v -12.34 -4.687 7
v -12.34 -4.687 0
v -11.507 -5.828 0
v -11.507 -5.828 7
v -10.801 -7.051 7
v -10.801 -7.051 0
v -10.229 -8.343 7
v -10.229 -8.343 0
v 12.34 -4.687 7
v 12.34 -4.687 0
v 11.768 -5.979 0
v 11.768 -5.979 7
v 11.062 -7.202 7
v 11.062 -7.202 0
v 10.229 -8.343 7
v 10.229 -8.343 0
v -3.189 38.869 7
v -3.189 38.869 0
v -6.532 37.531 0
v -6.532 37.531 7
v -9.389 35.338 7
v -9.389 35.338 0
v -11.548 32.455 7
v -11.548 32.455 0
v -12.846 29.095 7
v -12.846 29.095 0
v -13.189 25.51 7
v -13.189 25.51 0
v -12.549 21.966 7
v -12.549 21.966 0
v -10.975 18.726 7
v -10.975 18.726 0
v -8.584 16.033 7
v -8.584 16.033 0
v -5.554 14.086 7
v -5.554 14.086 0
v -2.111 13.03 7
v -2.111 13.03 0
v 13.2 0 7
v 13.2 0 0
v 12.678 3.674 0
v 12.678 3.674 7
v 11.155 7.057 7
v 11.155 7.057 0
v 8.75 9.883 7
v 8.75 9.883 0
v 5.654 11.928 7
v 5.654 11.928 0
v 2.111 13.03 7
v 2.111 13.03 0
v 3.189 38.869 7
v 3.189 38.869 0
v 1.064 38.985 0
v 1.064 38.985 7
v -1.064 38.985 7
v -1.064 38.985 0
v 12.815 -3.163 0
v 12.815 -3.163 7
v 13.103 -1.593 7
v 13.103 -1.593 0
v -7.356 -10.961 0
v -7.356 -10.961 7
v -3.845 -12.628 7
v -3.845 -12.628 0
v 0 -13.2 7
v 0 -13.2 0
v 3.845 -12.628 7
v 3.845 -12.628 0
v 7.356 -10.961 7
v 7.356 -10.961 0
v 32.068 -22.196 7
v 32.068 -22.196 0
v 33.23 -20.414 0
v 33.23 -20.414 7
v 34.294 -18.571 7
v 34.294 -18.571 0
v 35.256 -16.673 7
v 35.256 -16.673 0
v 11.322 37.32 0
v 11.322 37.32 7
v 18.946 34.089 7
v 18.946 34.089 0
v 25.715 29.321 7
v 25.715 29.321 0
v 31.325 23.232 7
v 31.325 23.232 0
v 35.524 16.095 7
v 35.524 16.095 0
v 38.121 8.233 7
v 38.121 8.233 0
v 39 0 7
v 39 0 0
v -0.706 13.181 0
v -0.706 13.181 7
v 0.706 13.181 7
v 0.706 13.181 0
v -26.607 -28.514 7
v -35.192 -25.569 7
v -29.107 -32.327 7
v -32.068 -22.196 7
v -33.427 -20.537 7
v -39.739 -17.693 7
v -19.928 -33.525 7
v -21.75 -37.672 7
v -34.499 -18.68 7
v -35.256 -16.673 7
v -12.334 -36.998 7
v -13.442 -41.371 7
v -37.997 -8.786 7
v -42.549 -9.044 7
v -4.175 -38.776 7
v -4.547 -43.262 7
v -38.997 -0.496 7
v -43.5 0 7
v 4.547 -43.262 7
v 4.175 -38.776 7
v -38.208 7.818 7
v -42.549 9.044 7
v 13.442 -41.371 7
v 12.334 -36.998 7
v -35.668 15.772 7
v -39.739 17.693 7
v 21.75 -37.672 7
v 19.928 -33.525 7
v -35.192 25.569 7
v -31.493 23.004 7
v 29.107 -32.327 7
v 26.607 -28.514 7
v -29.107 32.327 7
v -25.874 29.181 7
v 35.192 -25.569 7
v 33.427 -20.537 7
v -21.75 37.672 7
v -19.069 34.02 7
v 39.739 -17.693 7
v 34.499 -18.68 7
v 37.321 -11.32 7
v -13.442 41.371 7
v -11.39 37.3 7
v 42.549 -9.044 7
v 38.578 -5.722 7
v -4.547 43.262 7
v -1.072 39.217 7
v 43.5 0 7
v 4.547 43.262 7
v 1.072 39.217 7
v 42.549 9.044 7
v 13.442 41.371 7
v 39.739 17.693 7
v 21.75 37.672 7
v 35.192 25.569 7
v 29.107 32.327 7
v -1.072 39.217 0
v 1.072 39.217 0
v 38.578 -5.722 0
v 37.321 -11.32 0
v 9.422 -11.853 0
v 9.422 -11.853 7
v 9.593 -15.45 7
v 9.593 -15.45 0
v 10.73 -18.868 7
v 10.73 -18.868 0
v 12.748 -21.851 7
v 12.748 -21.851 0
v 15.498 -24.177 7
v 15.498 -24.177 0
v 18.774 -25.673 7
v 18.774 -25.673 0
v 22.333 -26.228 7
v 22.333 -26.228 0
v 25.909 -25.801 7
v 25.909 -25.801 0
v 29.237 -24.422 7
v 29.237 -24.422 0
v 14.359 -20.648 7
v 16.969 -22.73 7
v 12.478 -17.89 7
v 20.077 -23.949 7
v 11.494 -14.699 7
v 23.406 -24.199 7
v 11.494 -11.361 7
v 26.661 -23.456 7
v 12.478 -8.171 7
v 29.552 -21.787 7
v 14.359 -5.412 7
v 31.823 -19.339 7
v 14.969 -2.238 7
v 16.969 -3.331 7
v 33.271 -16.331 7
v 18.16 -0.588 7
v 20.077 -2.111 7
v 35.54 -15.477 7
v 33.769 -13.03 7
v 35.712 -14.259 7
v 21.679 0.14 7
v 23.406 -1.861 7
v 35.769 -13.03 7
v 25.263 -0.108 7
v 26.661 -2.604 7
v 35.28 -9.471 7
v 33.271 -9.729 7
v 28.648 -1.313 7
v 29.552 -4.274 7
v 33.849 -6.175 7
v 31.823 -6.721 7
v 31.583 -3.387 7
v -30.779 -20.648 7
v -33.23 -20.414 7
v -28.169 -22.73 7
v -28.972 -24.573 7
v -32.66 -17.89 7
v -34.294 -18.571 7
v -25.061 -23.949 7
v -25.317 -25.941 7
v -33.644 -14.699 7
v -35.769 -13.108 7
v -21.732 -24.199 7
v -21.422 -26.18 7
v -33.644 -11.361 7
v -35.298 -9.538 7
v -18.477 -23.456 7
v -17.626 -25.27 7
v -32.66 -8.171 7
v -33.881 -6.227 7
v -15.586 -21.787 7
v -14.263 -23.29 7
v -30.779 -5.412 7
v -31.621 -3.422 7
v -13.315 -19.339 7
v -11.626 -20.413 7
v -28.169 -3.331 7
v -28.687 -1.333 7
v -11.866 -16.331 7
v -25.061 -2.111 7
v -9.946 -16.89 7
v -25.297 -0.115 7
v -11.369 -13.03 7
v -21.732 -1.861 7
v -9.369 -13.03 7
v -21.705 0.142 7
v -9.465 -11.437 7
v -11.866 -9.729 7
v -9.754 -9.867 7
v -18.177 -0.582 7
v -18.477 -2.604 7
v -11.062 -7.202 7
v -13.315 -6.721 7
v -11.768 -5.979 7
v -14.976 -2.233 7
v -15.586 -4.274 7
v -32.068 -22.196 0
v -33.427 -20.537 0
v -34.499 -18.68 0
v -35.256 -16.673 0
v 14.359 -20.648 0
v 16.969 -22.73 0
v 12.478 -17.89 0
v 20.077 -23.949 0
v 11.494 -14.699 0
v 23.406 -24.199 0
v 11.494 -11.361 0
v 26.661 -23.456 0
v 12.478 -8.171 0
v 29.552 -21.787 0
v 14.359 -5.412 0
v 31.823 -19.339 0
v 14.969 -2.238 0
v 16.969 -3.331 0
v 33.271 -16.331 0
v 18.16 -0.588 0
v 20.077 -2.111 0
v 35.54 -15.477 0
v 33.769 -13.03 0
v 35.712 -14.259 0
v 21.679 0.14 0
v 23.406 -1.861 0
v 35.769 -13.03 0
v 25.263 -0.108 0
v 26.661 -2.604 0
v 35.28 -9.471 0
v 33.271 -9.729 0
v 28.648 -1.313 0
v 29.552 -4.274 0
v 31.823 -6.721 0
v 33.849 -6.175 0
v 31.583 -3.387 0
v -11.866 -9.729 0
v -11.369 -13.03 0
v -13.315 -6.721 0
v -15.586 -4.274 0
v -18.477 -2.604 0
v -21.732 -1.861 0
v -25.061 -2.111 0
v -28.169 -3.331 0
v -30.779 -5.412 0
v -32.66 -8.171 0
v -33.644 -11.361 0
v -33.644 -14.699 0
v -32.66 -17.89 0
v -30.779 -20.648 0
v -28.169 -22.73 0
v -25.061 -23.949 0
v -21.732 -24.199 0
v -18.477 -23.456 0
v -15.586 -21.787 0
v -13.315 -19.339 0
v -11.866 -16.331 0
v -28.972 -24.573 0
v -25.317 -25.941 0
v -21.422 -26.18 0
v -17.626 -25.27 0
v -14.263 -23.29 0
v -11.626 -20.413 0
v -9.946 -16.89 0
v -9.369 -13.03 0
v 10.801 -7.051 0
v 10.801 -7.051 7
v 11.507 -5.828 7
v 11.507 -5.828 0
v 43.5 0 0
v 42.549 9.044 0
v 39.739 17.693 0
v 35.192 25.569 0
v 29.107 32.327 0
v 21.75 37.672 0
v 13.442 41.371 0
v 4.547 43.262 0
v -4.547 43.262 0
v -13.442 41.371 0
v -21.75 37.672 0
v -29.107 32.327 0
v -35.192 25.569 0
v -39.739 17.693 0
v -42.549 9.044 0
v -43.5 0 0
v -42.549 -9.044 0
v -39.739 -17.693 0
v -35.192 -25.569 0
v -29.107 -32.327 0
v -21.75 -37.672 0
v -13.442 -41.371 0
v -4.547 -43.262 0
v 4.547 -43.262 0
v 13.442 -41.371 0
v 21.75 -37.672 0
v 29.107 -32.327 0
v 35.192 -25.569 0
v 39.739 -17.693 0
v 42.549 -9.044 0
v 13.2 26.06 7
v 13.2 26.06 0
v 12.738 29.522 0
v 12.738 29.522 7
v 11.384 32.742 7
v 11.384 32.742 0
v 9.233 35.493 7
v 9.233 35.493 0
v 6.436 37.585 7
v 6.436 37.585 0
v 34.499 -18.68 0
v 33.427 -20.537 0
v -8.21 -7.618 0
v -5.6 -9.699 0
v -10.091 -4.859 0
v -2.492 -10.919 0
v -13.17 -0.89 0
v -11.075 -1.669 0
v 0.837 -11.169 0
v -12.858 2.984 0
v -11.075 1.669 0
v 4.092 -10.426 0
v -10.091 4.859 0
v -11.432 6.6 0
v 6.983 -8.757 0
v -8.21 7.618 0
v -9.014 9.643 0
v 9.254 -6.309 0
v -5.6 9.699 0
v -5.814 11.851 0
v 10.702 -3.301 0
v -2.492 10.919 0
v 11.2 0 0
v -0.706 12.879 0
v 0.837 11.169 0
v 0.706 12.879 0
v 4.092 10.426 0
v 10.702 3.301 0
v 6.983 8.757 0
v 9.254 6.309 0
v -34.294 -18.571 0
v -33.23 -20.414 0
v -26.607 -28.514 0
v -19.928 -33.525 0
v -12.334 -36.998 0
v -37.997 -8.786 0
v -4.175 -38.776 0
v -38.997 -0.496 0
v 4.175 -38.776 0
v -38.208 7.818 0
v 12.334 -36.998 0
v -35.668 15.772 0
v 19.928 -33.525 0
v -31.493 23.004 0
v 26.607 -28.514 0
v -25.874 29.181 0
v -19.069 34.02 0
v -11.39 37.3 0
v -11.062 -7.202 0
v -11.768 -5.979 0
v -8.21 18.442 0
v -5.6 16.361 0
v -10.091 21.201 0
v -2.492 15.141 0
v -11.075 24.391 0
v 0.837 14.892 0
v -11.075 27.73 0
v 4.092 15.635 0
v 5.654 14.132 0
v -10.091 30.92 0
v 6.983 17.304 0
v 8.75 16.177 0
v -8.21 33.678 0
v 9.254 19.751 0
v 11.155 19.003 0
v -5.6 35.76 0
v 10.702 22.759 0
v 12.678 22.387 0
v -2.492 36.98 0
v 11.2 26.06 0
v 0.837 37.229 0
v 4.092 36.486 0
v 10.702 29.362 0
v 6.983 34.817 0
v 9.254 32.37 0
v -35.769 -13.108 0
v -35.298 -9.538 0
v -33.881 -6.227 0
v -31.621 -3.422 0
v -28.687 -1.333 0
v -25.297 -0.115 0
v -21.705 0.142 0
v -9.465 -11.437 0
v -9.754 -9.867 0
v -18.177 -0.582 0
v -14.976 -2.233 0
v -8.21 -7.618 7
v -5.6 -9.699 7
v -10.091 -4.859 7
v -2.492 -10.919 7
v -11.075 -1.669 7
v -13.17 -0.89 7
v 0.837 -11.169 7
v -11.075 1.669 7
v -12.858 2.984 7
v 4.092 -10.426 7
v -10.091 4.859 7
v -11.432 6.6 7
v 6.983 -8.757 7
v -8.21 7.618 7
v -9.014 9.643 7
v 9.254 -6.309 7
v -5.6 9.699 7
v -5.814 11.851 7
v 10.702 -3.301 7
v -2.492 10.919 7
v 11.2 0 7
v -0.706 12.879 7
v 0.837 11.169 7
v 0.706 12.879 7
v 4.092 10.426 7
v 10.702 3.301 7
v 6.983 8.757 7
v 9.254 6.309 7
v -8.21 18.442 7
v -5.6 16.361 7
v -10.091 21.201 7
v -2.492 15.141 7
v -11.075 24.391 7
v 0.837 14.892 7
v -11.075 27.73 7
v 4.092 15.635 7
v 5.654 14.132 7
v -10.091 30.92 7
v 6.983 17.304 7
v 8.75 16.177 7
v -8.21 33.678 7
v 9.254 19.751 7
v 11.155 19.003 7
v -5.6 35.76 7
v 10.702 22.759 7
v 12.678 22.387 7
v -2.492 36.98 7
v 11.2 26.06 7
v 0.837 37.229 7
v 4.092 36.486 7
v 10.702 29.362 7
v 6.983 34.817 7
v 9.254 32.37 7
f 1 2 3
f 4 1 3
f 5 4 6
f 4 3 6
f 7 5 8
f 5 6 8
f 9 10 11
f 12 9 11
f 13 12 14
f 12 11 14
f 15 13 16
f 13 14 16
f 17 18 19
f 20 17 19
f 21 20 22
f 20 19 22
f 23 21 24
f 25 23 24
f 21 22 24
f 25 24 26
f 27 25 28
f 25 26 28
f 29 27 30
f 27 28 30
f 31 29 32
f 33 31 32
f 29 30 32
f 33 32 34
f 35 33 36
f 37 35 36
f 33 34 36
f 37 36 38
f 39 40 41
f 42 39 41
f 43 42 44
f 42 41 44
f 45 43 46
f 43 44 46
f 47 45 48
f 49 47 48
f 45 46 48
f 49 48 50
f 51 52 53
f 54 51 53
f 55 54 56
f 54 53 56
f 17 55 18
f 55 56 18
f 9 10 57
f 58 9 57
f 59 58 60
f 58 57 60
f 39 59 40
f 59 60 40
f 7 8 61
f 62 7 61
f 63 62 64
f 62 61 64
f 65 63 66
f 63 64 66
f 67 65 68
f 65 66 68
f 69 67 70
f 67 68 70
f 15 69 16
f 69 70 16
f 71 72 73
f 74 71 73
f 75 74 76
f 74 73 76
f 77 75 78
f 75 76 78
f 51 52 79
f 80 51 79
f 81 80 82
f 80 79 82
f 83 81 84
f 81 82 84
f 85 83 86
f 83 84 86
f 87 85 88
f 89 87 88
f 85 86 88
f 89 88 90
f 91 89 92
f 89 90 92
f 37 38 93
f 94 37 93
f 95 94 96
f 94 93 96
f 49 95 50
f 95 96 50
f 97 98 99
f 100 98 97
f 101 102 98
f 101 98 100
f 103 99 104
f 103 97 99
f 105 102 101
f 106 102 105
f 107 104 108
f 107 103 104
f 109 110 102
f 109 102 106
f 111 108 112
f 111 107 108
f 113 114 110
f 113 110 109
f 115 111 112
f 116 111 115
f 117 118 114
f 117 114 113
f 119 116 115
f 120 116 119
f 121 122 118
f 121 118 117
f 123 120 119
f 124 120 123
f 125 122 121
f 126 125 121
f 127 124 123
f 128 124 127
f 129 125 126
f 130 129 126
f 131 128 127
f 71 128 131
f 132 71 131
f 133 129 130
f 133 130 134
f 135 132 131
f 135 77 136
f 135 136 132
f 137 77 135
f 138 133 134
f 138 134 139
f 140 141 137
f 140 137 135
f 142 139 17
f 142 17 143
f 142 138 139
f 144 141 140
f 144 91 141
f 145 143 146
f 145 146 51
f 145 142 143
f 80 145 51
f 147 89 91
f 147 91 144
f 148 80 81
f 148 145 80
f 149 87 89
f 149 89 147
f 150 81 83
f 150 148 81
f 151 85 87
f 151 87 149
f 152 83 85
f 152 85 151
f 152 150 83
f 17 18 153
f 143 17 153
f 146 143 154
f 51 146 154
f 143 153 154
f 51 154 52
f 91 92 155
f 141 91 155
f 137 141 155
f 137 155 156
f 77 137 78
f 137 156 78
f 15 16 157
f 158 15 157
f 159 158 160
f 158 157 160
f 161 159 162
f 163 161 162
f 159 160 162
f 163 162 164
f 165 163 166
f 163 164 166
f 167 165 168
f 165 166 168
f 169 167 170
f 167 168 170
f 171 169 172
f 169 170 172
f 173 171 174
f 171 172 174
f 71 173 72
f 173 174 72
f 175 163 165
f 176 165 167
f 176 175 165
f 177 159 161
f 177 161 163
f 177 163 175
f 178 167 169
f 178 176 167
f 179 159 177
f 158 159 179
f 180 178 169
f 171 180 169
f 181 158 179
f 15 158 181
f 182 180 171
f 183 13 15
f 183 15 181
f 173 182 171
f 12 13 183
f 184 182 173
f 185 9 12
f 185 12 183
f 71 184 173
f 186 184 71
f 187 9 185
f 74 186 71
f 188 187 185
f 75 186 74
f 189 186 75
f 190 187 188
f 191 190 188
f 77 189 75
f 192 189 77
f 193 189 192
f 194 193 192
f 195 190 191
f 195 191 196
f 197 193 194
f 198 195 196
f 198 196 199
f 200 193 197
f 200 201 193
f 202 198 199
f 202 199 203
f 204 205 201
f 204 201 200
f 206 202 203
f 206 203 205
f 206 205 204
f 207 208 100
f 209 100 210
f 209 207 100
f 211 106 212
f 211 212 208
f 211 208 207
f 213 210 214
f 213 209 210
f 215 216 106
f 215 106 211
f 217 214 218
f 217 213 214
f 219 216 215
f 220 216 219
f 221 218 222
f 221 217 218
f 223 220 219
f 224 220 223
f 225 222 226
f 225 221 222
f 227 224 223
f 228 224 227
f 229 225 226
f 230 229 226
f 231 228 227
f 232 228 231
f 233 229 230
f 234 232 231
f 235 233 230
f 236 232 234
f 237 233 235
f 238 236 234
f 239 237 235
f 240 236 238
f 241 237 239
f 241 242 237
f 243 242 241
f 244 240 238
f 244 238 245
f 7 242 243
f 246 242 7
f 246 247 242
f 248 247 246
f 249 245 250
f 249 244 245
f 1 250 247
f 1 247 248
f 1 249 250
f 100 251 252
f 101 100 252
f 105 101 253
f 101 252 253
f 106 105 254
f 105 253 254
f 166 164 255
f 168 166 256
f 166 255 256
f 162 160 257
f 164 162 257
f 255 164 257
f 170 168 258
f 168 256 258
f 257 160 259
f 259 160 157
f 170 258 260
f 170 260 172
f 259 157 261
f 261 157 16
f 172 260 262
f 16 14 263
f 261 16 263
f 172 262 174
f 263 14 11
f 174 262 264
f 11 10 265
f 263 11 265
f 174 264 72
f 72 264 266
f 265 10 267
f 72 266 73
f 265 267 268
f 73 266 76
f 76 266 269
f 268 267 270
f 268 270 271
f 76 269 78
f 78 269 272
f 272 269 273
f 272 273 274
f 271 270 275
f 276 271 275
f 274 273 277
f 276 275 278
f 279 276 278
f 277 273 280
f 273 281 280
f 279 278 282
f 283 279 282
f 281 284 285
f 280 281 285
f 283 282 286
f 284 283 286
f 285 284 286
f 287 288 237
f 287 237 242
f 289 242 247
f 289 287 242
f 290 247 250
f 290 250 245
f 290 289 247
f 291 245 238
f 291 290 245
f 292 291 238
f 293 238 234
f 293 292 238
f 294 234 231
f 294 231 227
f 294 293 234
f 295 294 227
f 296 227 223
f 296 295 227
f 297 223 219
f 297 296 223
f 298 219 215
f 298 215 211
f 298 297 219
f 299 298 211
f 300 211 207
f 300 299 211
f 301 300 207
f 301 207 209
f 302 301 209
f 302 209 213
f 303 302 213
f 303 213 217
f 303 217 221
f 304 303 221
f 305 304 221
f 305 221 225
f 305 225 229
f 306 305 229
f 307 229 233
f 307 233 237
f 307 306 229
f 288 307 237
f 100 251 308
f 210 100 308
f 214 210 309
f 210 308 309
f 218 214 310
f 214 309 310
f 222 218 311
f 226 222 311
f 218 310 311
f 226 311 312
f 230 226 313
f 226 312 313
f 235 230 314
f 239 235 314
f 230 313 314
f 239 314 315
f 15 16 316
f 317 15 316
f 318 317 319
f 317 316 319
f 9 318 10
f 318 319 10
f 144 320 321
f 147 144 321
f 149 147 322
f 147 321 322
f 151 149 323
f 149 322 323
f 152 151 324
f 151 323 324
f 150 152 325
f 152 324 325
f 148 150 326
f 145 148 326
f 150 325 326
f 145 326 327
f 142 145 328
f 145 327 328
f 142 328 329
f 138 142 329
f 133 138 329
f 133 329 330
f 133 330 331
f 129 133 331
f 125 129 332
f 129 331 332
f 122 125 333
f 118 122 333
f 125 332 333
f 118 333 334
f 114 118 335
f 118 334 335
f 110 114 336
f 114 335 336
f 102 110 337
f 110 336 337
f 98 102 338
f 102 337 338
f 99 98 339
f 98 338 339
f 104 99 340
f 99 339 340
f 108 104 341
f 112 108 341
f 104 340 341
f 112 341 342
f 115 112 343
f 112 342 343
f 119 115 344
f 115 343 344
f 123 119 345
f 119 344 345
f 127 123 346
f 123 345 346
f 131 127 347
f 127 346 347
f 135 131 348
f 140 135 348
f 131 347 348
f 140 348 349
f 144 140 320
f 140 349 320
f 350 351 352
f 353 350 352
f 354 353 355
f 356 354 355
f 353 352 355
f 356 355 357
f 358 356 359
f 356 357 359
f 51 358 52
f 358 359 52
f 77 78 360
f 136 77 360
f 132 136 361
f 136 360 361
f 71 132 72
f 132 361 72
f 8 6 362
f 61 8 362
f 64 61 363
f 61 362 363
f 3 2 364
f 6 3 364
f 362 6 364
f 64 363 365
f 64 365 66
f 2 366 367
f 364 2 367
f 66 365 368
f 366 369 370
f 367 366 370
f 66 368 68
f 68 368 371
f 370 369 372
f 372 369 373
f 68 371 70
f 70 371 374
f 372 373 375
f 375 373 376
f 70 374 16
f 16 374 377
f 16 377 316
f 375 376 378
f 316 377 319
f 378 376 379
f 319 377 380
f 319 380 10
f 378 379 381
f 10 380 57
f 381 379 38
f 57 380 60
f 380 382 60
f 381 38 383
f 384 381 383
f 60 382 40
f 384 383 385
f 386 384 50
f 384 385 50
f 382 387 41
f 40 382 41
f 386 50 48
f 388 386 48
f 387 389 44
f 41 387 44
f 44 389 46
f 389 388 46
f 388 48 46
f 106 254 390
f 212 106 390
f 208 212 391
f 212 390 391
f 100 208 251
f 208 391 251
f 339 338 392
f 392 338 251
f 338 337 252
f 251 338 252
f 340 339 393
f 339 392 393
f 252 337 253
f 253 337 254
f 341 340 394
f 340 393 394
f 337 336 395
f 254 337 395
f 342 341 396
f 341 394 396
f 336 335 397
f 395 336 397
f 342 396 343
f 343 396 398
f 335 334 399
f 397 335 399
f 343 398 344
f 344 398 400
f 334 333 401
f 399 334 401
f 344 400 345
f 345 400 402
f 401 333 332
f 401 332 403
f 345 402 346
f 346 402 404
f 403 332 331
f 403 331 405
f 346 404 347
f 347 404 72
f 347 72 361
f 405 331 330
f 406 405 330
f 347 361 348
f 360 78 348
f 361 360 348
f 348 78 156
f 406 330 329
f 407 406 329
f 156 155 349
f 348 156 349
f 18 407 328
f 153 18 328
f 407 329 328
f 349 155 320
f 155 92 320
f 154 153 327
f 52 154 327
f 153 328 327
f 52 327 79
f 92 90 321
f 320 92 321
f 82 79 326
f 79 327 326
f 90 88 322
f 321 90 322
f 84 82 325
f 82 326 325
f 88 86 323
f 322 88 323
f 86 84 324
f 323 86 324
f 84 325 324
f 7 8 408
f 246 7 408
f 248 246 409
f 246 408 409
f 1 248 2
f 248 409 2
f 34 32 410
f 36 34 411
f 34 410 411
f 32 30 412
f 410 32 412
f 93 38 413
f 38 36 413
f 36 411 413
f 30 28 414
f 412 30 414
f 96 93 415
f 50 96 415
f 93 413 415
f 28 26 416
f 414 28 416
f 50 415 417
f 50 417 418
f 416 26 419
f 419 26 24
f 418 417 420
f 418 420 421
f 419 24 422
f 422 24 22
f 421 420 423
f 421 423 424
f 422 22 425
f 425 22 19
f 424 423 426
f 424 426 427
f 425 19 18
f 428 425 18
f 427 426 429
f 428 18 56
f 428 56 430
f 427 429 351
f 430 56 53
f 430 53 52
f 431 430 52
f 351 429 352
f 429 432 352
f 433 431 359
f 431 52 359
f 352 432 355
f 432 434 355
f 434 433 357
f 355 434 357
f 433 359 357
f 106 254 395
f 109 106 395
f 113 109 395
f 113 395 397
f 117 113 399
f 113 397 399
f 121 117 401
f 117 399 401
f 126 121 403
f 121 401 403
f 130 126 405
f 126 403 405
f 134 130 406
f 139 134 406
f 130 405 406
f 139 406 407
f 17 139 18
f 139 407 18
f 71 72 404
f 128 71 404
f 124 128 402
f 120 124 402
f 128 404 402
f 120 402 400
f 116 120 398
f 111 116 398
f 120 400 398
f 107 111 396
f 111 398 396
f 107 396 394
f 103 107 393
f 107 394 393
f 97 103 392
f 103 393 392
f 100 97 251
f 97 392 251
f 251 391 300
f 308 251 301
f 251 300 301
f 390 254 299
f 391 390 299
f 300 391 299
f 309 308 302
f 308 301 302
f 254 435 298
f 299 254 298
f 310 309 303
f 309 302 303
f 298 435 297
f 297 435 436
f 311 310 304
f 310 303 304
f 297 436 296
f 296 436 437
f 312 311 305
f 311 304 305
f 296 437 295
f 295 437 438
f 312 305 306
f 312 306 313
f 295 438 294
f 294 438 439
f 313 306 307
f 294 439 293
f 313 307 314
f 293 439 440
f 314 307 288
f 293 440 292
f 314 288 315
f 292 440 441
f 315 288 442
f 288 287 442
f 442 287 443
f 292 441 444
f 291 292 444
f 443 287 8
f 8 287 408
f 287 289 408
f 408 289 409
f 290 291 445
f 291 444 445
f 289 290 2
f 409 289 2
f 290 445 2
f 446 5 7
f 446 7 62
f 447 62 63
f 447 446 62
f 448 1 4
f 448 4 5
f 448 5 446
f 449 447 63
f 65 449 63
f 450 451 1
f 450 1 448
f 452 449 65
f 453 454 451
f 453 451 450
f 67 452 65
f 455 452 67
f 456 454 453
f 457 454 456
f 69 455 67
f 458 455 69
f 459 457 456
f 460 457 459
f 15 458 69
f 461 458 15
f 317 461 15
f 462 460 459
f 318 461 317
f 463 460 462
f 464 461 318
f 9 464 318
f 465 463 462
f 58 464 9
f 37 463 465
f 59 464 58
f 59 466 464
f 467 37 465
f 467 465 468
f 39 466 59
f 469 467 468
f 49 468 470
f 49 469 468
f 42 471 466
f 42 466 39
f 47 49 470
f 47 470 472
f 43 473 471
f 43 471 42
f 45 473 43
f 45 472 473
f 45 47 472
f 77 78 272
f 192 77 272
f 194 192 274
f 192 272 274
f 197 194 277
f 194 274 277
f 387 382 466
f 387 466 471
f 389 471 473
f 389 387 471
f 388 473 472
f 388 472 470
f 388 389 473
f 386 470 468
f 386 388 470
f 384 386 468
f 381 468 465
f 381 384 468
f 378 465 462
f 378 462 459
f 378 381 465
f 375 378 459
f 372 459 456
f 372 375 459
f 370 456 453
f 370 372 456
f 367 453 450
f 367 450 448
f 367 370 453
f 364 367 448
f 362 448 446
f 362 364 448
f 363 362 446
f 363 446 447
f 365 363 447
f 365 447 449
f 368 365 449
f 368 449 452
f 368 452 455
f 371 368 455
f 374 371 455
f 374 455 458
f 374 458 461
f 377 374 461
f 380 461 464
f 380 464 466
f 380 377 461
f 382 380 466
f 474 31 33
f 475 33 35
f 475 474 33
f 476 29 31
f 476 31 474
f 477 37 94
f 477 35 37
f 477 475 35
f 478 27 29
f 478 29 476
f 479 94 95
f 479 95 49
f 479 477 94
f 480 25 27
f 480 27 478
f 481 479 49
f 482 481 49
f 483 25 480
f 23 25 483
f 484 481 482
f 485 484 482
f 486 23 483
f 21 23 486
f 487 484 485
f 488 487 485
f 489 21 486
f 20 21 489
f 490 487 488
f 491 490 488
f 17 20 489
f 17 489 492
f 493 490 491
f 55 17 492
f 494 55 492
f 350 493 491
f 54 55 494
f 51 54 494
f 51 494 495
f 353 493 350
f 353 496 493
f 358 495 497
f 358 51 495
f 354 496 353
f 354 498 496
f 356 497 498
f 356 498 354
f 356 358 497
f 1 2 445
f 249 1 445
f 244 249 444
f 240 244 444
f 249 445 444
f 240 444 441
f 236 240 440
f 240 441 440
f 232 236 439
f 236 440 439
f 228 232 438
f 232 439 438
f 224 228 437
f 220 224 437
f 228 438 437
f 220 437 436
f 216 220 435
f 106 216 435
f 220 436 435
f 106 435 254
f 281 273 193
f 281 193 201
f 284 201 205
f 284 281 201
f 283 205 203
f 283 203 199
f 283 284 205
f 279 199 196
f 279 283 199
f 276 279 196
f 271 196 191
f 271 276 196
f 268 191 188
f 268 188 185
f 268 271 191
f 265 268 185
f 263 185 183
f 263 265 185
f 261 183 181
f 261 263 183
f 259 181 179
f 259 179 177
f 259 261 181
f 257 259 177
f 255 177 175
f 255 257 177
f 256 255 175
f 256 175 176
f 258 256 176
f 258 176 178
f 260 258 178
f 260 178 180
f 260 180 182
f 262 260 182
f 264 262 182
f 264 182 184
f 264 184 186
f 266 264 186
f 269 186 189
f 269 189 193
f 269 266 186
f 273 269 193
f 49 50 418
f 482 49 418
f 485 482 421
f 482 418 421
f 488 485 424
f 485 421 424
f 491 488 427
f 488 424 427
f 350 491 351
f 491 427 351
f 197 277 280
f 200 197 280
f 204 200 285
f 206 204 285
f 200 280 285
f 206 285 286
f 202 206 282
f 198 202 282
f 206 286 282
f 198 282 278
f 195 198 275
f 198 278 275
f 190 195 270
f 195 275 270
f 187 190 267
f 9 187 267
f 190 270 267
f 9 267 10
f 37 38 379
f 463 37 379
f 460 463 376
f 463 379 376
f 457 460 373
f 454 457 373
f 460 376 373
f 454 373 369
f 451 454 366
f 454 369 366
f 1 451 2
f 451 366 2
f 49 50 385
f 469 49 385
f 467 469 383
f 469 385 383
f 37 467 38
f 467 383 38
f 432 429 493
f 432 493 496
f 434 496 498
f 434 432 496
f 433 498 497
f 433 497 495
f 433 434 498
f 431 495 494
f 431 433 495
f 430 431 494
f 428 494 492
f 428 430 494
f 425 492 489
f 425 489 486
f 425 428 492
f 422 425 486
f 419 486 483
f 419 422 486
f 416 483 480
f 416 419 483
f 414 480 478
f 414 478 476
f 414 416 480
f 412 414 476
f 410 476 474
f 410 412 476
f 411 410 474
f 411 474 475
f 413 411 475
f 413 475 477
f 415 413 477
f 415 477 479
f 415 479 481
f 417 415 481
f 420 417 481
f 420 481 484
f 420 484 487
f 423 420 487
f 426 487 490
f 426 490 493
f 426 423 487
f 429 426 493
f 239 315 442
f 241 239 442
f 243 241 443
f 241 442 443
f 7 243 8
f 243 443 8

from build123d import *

# Parameters (mm, degrees)
F0_R     = 11.2
F1_DEPTH = 7
F0_R_2   = 43.5


with BuildPart() as f1:
    # F0 (on Top) → F1 (new body)
    with BuildSketch(Plane.XY):
        with BuildLine():
            ThreePointArc((12.3397678435, -4.6872304796), (12.9831609313, -2.3827572753), (13.2, 0))
            ThreePointArc((13.2, 0), (10.0523685502, 8.5551087971), (2.110623253, 13.0301676691))
            ThreePointArc((2.110623253, 13.0301676691), (0, 12.8603353381), (-2.110623253, 13.0301676691))
            ThreePointArc((-2.110623253, 13.0301676691), (-11.43153533, 6.6), (-12.3397678435, -4.6872304796))
            ThreePointArc((-12.3397678435, -4.6872304796), (-11.137377104, -6.4301676691), (-10.2291445905, -8.3429371895))
            ThreePointArc((-10.2291445905, -8.3429371895), (0, -13.2), (10.2291445905, -8.3429371895))
            ThreePointArc((10.2291445905, -8.3429371895), (11.137377104, -6.4301676691), (12.3397678435, -4.6872304796))
        make_face()
        Circle(F0_R, mode=Mode.SUBTRACT)
    extrude(amount=F1_DEPTH)


with BuildPart() as f1b:
    # F0 (on Top) → F1, piece 2 (new body)
    with BuildSketch(Plane.XY):
        with BuildLine():
            ThreePointArc((35.7689124339, -13.0301676691), (26.9969645681, -0.5950418435), (12.3397678435, -4.6872304796))
            ThreePointArc((12.3397678435, -4.6872304796), (11.43153533, -6.6), (10.2291445905, -8.3429371895))
            ThreePointArc((10.2291445905, -8.3429371895), (15.4981714856, -24.1766748548), (32.0676372836, -22.1960951306))
            ThreePointArc((32.0676372836, -22.1960951306), (33.7749907476, -19.5), (35.2562008897, -16.6733409616))
            ThreePointArc((35.2562008897, -16.6733409616), (35.6401060982, -14.8697046194), (35.7689124339, -13.0301676691))
        make_face()
        with Locations((22.5689124339, -13.0301676691)):
            Circle(F0_R, mode=Mode.SUBTRACT)
    extrude(amount=F1_DEPTH)


with BuildPart() as f1c:
    # F0 (on Top) → F1, piece 3 (new body)
    with BuildSketch(Plane.XY):
        with BuildLine():
            ThreePointArc((-2.110623253, 13.0301676691), (0, 13.2), (2.110623253, 13.0301676691))
            ThreePointArc((2.110623253, 13.0301676691), (10.0523685502, 17.505226541), (13.2, 26.0603353381))
            ThreePointArc((13.2, 26.0603353381), (10.4002172958, 34.1890179005), (3.1885636061, 38.8694360923))
            ThreePointArc((3.1885636061, 38.8694360923), (0, 39), (-3.1885636061, 38.8694360923))
            ThreePointArc((-3.1885636061, 38.8694360923), (-13.1885288605, 25.5101476461), (-2.110623253, 13.0301676691))
        make_face()
        with Locations((0, 26.0603353381)):
            Circle(F0_R, mode=Mode.SUBTRACT)
    extrude(amount=F1_DEPTH)


with BuildPart() as f1d:
    # F0 (on Top) → F1, piece 4 (new body)
    with BuildSketch(Plane.XY):
        with BuildLine():
            ThreePointArc((-10.2291445905, -8.3429371895), (-11.43153533, -6.6), (-12.3397678435, -4.6872304796))
            ThreePointArc((-12.3397678435, -4.6872304796), (-28.6867003461, -1.3334727913), (-35.2562008897, -16.6733409616))
            ThreePointArc((-35.2562008897, -16.6733409616), (-33.7749907476, -19.5), (-32.0676372836, -22.1960951306))
            ThreePointArc((-32.0676372836, -22.1960951306), (-17.6264013321, -25.2699219153), (-9.3689124339, -13.0301676691))
            ThreePointArc((-9.3689124339, -13.0301676691), (-9.5857515027, -10.6474103938), (-10.2291445905, -8.3429371895))
        make_face()
        with Locations((-22.5689124339, -13.0301676691)):
            Circle(F0_R, mode=Mode.SUBTRACT)
    extrude(amount=F1_DEPTH)


with BuildPart() as f1e:
    # F0 (on Top) → F1, piece 5 (new body)
    with BuildSketch(Plane.XY):
        Circle(F0_R_2)
        with BuildLine():
            ThreePointArc((-35.2562008897, -16.6733409616), (-33.7749907476, 19.5), (-3.1885636061, 38.8694360923))
            ThreePointArc((-3.1885636061, 38.8694360923), (0, 39.2603353381), (3.1885636061, 38.8694360923))
            ThreePointArc((3.1885636061, 38.8694360923), (28.6823463182, 26.4258019685), (39, 0))
            ThreePointArc((39, 0), (38.052541536, -8.544242661), (35.2562008897, -16.6733409616))
            ThreePointArc((35.2562008897, -16.6733409616), (34.0004477639, -19.6301676691), (32.0676372836, -22.1960951306))
            ThreePointArc((32.0676372836, -22.1960951306), (0, -39), (-32.0676372836, -22.1960951306))
            ThreePointArc((-32.0676372836, -22.1960951306), (-34.0004477639, -19.6301676691), (-35.2562008897, -16.6733409616))
        make_face(mode=Mode.SUBTRACT)
    extrude(amount=F1_DEPTH)


solid = Compound([f1.part, f1b.part, f1c.part, f1d.part, f1e.part])
